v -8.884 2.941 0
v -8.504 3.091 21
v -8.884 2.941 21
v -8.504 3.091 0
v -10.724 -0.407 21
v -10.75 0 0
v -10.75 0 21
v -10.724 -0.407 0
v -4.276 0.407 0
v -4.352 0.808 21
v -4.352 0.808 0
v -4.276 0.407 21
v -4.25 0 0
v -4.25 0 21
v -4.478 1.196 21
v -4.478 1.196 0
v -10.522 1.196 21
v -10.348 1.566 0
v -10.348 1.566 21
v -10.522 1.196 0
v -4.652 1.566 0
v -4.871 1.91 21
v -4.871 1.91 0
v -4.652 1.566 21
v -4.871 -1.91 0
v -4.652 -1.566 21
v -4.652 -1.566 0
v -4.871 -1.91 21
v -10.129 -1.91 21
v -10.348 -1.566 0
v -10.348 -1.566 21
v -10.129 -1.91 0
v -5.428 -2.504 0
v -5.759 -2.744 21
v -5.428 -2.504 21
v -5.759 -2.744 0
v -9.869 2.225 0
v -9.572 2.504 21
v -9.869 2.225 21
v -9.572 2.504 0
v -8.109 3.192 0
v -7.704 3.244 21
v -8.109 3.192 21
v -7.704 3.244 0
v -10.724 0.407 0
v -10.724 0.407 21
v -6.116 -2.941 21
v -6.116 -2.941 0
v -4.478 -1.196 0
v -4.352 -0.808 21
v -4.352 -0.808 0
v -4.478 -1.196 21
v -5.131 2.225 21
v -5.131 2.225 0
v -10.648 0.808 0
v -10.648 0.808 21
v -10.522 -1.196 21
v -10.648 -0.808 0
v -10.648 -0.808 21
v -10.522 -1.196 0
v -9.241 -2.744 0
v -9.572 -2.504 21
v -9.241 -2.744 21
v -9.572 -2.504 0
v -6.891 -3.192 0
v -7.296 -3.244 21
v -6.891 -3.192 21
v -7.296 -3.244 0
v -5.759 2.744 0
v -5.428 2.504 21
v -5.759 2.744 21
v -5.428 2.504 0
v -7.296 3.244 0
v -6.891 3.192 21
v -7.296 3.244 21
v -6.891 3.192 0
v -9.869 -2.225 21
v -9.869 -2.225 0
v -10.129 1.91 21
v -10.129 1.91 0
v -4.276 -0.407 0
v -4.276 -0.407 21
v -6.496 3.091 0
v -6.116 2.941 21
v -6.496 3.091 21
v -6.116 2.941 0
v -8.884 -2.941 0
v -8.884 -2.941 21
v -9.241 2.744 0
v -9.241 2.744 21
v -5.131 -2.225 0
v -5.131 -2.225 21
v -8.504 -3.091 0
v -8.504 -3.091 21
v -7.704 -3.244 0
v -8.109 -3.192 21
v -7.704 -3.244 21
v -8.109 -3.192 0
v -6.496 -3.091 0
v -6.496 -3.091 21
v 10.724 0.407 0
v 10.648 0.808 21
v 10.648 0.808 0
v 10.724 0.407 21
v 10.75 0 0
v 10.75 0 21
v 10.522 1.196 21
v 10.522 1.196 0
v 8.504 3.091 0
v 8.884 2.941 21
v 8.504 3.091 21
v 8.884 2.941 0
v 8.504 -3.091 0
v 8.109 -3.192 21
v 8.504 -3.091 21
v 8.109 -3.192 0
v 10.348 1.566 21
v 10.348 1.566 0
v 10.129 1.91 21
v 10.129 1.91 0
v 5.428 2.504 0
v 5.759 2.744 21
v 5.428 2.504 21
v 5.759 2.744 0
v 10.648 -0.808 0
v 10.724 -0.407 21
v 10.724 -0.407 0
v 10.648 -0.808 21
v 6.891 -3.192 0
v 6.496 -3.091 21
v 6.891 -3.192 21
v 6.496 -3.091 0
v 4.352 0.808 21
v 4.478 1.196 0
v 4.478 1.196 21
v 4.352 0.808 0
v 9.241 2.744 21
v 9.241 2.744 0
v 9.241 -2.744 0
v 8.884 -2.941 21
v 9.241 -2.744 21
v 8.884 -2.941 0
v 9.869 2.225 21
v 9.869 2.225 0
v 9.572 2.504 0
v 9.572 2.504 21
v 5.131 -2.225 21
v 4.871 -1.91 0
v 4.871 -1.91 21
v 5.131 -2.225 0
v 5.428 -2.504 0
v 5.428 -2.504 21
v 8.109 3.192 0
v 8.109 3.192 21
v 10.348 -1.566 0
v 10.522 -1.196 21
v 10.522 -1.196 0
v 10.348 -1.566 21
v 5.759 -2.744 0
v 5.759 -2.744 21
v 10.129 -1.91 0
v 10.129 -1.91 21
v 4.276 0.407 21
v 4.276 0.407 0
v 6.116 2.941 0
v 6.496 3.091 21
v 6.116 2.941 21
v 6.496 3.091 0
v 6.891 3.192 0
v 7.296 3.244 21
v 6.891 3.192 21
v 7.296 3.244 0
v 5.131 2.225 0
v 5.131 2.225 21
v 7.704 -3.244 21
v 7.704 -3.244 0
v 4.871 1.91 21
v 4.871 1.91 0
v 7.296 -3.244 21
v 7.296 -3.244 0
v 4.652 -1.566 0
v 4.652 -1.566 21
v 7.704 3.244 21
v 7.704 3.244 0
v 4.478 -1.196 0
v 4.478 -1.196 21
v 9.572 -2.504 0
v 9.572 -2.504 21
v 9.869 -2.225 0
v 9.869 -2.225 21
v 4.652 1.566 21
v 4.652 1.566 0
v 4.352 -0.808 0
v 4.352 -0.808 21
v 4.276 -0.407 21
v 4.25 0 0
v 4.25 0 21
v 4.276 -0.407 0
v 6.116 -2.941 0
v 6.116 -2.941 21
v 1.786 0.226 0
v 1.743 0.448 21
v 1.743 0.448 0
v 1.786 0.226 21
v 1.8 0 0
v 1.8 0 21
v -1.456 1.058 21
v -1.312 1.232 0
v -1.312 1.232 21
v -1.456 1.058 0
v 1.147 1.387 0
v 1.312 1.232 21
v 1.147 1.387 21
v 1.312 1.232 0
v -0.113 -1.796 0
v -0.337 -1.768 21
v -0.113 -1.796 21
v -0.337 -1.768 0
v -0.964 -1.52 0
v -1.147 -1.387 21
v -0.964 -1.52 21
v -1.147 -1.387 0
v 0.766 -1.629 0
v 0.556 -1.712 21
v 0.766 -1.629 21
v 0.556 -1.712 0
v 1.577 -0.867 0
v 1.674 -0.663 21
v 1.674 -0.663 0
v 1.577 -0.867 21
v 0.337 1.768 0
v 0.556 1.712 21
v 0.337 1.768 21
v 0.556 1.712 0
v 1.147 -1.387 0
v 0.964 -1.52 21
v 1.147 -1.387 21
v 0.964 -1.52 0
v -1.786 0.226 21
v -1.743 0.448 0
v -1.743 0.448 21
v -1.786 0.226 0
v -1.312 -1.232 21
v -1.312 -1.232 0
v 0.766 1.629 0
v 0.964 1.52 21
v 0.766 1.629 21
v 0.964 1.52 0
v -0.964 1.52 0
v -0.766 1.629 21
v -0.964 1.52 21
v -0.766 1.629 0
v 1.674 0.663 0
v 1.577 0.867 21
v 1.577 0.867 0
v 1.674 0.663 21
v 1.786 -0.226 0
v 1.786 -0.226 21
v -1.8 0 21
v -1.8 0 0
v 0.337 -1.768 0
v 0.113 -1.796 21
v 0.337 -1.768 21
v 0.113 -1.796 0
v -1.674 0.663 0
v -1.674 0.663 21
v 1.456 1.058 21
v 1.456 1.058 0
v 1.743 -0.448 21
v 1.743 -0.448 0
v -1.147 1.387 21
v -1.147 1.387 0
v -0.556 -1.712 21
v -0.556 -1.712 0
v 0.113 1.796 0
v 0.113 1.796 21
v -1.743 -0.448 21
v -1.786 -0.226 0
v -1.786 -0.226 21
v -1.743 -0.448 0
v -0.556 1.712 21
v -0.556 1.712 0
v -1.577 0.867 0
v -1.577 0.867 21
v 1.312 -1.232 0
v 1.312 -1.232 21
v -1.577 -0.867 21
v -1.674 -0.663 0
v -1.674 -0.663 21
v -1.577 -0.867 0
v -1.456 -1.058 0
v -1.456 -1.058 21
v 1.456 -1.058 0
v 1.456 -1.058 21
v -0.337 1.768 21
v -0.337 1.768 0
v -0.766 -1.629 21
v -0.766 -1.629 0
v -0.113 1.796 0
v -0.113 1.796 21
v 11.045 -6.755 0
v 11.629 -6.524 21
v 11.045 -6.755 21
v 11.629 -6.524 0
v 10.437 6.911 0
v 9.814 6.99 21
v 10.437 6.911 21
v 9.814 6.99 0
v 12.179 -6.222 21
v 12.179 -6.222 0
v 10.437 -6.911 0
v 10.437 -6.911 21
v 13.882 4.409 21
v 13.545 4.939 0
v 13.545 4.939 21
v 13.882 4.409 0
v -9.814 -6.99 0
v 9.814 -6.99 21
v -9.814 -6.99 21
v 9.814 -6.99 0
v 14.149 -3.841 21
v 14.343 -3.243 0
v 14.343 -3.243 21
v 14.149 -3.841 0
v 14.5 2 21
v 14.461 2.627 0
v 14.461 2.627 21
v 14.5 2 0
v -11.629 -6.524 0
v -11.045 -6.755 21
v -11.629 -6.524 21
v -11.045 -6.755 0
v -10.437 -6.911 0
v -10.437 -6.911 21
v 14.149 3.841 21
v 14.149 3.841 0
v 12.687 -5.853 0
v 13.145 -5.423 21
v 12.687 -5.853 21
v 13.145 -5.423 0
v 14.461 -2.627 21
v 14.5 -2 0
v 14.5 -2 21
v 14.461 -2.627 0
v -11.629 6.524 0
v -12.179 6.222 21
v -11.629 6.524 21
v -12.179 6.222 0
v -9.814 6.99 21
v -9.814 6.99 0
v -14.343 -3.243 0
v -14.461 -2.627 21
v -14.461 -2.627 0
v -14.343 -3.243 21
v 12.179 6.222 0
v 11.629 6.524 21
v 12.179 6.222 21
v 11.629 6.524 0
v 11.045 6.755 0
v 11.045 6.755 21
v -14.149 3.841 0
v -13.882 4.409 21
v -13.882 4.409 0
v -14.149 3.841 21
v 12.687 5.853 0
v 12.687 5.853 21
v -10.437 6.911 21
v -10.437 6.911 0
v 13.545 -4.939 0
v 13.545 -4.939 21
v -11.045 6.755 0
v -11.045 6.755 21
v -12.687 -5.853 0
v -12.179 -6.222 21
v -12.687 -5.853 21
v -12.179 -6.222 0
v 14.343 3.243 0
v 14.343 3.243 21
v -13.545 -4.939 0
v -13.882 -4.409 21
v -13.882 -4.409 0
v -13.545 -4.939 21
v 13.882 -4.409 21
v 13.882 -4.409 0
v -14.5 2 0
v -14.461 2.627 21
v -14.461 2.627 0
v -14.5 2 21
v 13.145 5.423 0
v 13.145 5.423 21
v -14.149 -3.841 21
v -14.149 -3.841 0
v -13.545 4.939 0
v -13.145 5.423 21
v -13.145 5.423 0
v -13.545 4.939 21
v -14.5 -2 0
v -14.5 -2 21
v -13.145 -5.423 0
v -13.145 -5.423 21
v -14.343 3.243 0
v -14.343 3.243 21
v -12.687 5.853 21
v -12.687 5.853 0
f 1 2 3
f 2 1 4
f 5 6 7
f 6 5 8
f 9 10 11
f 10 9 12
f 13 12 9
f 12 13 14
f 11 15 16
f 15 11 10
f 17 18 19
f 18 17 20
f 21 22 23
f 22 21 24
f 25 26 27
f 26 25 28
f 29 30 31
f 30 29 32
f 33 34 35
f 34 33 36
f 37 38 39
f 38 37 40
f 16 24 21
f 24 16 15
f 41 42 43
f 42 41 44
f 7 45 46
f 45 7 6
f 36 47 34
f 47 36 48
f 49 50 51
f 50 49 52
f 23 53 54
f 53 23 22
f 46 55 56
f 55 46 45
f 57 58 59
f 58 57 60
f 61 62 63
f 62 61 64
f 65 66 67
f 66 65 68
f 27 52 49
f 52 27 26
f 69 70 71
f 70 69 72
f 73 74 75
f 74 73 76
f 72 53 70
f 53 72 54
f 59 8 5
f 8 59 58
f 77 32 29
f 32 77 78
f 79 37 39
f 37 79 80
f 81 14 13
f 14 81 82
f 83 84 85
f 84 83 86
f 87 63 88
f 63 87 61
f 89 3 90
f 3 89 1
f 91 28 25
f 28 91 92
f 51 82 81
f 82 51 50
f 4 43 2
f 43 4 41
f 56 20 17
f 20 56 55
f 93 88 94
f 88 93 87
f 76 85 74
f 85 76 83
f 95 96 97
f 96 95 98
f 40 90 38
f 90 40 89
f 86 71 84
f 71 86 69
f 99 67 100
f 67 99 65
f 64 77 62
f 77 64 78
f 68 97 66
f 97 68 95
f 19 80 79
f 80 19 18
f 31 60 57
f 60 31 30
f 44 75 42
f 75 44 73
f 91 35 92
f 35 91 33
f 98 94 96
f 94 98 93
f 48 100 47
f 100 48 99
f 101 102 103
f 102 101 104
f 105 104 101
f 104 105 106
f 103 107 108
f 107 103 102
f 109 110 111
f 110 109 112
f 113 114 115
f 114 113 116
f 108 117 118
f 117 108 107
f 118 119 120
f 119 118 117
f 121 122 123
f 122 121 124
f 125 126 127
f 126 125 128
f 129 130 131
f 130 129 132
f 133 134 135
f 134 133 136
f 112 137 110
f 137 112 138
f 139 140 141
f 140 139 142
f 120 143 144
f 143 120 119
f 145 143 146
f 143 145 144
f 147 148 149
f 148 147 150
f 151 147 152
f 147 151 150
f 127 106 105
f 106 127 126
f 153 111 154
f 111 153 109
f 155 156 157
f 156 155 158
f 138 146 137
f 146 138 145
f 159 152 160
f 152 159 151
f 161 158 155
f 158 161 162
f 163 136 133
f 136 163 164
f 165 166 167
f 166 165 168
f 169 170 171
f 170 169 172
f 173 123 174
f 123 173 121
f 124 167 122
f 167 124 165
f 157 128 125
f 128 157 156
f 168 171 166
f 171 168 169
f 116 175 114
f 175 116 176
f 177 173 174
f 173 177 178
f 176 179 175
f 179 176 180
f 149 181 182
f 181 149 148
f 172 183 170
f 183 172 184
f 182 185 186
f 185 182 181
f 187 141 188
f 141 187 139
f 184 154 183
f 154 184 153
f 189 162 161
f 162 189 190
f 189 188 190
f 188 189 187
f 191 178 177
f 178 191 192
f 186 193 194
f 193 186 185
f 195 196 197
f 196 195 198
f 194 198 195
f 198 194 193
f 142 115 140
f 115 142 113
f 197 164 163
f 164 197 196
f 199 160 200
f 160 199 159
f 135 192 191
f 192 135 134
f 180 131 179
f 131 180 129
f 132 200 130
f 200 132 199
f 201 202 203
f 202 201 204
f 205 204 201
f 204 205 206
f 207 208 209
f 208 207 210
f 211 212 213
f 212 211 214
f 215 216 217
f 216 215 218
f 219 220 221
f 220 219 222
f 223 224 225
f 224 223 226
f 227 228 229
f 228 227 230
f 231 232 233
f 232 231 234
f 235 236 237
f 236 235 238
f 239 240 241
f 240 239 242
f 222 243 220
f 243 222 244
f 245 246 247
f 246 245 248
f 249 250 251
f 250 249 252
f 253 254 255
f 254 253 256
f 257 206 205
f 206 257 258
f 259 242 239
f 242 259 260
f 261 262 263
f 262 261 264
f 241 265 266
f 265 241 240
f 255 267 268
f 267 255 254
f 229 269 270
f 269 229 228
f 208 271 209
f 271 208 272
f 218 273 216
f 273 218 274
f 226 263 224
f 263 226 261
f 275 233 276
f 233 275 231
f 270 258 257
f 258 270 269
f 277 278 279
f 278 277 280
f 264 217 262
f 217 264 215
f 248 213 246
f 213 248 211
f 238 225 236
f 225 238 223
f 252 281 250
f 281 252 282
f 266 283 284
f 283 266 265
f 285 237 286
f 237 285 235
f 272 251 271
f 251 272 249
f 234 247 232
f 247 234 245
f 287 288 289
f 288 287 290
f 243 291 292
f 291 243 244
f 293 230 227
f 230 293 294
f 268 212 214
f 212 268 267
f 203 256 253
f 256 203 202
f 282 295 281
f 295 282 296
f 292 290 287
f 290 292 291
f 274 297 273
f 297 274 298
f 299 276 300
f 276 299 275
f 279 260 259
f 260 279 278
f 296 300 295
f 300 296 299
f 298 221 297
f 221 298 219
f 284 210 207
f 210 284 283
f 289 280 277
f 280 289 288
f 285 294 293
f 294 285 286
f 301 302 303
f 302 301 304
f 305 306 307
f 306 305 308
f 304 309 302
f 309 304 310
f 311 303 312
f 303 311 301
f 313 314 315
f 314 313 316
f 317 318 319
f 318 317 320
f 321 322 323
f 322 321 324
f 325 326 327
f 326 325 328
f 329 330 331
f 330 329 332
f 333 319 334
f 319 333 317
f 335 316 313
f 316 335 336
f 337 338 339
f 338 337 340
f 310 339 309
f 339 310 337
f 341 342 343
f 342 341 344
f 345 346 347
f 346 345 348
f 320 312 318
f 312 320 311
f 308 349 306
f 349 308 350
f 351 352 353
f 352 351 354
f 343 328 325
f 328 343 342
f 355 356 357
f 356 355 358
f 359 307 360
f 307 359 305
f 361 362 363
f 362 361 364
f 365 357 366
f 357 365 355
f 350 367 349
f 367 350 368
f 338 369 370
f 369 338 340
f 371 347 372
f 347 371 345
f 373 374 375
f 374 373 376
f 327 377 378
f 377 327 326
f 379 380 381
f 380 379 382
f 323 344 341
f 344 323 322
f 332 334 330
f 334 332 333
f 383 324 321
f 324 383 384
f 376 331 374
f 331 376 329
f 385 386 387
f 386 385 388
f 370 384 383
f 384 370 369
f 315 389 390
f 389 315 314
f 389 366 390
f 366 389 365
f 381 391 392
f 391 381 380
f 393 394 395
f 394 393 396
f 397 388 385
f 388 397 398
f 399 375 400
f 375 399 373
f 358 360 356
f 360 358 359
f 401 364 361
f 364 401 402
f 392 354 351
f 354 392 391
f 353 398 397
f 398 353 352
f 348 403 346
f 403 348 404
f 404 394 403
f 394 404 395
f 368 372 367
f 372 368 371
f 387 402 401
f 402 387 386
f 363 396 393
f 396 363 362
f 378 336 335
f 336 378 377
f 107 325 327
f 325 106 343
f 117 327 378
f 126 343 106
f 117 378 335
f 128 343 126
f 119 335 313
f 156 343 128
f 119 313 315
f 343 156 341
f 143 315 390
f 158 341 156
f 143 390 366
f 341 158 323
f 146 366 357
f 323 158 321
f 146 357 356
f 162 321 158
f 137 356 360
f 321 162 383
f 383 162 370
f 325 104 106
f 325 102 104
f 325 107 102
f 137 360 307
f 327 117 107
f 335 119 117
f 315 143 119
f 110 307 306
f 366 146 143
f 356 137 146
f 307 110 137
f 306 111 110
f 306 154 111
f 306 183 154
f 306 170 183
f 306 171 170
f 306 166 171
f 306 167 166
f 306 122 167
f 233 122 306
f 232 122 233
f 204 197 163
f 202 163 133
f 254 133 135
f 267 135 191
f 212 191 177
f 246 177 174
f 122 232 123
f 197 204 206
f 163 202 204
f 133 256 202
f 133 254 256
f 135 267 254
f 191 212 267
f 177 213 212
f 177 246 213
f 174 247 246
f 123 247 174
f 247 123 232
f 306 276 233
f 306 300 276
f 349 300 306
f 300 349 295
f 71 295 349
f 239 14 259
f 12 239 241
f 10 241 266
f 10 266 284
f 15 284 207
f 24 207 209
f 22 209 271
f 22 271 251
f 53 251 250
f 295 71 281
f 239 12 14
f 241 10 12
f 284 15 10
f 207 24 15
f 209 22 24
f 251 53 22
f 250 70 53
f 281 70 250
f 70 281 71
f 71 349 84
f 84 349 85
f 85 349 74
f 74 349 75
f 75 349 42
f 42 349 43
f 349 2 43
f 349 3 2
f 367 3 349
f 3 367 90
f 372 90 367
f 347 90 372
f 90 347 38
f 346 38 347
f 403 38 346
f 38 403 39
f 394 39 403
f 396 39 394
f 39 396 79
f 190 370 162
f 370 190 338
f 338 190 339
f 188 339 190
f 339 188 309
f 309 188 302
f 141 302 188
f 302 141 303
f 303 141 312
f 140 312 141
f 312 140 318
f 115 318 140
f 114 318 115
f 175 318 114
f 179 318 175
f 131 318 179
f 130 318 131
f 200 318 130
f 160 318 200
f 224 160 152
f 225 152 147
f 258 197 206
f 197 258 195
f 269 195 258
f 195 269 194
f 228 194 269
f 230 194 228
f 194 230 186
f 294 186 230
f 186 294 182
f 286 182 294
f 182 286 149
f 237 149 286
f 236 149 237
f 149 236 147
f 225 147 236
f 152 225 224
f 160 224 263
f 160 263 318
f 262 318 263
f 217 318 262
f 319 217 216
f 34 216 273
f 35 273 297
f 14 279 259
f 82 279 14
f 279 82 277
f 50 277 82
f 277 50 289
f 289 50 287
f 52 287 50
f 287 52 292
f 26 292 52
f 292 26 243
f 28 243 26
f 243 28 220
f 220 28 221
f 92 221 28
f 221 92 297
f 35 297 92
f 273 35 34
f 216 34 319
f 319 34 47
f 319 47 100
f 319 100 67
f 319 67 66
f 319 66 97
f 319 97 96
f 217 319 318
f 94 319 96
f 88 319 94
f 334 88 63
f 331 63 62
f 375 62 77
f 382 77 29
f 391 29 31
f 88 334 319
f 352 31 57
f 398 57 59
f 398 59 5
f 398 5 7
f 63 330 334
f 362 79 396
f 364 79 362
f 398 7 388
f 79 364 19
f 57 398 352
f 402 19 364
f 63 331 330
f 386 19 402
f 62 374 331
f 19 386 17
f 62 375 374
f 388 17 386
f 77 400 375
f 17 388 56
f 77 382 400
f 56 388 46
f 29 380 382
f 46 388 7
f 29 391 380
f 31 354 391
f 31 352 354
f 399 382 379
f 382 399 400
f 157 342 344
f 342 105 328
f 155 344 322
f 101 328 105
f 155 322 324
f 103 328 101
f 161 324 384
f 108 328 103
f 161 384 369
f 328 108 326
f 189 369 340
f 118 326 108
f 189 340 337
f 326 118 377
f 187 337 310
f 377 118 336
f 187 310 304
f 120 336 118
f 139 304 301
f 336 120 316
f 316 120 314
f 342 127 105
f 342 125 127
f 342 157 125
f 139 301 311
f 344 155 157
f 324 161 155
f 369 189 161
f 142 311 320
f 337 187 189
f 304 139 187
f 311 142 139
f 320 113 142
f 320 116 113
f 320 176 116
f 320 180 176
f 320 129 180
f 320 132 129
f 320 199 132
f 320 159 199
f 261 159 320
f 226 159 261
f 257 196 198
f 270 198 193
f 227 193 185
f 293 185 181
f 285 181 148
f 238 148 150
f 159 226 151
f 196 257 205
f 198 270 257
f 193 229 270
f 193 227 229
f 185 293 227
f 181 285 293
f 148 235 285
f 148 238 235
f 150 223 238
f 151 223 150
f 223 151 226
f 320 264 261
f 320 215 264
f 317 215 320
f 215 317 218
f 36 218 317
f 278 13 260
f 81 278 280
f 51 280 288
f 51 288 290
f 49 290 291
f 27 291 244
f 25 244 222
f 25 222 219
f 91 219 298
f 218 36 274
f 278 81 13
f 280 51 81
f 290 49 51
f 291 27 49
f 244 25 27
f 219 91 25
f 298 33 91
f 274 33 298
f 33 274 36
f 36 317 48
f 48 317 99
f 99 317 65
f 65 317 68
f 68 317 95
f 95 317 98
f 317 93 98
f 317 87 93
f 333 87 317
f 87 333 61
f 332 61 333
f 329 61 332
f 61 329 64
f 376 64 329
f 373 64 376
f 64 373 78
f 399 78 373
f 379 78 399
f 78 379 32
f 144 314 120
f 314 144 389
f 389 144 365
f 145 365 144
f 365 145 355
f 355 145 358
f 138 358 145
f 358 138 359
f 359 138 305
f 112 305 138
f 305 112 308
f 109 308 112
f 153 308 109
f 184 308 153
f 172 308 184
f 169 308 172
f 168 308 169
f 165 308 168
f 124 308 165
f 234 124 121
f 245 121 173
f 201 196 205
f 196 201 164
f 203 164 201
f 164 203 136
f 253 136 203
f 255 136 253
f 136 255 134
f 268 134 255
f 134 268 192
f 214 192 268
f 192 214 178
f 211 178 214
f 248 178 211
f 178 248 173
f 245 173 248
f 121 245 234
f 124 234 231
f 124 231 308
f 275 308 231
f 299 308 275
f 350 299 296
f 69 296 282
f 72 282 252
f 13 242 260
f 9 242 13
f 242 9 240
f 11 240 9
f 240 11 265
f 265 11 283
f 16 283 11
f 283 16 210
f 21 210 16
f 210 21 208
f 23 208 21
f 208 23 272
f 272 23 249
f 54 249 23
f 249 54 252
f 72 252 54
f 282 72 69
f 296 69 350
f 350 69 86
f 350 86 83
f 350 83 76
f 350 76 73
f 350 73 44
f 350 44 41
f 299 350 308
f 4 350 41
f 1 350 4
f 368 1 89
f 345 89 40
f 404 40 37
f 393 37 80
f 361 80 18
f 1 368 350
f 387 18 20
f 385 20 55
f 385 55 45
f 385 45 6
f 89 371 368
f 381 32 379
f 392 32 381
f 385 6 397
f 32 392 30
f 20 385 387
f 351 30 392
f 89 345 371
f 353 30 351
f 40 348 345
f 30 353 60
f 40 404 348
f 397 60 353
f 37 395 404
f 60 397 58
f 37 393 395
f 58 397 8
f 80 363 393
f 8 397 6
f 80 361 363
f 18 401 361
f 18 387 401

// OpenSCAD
$fn = 50;


difference() {
	union() {
		*color(alpha = 1.0000000000, c = "gray") {
			translate(v = [0, 7, 0]) {
				linear_extrude(height = 1) {
					text(font = "Arial:style=Bold", halign = "center", size = 4.5000000000, text = "COMMENT plate main", valign = "center");
				}
			}
		}
		*color(alpha = 1.0000000000, c = "gray") {
			translate(v = [0, 14, 0]) {
				linear_extrude(height = 1) {
					text(font = "Arial:style=Bold", halign = "center", size = 4.5000000000, text = "COMMENT description oobb_plate_shape_p_type_21_depth_2_width_1_height_21_thickness_true_both_holes", valign = "center");
				}
			}
		}
		hull() {
			translate(v = [-9.5000000000, 2.0000000000, 0]) {
				cylinder(h = 21, r = 5);
			}
			translate(v = [9.5000000000, 2.0000000000, 0]) {
				cylinder(h = 21, r = 5);
			}
			translate(v = [-9.5000000000, -2.0000000000, 0]) {
				cylinder(h = 21, r = 5);
			}
			translate(v = [9.5000000000, -2.0000000000, 0]) {
				cylinder(h = 21, r = 5);
			}
		}
	}
	union() {
		*color(alpha = 1.0000000000, c = "gray") {
			translate(v = [0, 7, 0]) {
				linear_extrude(height = 1) {
					text(font = "Arial:style=Bold", halign = "center", size = 4.5000000000, text = "COMMENT holes main", valign = "center");
				}
			}
		}
		*color(alpha = 1.0000000000, c = "gray") {
			translate(v = [0, 14, 0]) {
				linear_extrude(height = 1) {
					text(font = "Arial:style=Bold", halign = "center", size = 4.5000000000, text = "COMMENT description oobb_holes_shape_n_type_2_width_1_height_21_thickness_true_both_holes", valign = "center");
				}
			}
		}
		translate(v = [-7.5000000000, 0.0000000000, 0]) {
			translate(v = [0, 0, -50]) {
				cylinder(h = 100, r = 3.2500000000);
			}
		}
		translate(v = [7.5000000000, 0.0000000000, 0]) {
			translate(v = [0, 0, -50]) {
				cylinder(h = 100, r = 3.2500000000);
			}
		}
		translate(v = [-7.5000000000, 0.0000000000, 0]) {
			translate(v = [0, 0, -50]) {
				cylinder(h = 100, r = 1.8000000000);
			}
		}
		translate(v = [0, 0, -50]) {
			cylinder(h = 100, r = 1.8000000000);
		}
		translate(v = [7.5000000000, 0.0000000000, 0]) {
			translate(v = [0, 0, -50]) {
				cylinder(h = 100, r = 1.8000000000);
			}
		}
	}
}
